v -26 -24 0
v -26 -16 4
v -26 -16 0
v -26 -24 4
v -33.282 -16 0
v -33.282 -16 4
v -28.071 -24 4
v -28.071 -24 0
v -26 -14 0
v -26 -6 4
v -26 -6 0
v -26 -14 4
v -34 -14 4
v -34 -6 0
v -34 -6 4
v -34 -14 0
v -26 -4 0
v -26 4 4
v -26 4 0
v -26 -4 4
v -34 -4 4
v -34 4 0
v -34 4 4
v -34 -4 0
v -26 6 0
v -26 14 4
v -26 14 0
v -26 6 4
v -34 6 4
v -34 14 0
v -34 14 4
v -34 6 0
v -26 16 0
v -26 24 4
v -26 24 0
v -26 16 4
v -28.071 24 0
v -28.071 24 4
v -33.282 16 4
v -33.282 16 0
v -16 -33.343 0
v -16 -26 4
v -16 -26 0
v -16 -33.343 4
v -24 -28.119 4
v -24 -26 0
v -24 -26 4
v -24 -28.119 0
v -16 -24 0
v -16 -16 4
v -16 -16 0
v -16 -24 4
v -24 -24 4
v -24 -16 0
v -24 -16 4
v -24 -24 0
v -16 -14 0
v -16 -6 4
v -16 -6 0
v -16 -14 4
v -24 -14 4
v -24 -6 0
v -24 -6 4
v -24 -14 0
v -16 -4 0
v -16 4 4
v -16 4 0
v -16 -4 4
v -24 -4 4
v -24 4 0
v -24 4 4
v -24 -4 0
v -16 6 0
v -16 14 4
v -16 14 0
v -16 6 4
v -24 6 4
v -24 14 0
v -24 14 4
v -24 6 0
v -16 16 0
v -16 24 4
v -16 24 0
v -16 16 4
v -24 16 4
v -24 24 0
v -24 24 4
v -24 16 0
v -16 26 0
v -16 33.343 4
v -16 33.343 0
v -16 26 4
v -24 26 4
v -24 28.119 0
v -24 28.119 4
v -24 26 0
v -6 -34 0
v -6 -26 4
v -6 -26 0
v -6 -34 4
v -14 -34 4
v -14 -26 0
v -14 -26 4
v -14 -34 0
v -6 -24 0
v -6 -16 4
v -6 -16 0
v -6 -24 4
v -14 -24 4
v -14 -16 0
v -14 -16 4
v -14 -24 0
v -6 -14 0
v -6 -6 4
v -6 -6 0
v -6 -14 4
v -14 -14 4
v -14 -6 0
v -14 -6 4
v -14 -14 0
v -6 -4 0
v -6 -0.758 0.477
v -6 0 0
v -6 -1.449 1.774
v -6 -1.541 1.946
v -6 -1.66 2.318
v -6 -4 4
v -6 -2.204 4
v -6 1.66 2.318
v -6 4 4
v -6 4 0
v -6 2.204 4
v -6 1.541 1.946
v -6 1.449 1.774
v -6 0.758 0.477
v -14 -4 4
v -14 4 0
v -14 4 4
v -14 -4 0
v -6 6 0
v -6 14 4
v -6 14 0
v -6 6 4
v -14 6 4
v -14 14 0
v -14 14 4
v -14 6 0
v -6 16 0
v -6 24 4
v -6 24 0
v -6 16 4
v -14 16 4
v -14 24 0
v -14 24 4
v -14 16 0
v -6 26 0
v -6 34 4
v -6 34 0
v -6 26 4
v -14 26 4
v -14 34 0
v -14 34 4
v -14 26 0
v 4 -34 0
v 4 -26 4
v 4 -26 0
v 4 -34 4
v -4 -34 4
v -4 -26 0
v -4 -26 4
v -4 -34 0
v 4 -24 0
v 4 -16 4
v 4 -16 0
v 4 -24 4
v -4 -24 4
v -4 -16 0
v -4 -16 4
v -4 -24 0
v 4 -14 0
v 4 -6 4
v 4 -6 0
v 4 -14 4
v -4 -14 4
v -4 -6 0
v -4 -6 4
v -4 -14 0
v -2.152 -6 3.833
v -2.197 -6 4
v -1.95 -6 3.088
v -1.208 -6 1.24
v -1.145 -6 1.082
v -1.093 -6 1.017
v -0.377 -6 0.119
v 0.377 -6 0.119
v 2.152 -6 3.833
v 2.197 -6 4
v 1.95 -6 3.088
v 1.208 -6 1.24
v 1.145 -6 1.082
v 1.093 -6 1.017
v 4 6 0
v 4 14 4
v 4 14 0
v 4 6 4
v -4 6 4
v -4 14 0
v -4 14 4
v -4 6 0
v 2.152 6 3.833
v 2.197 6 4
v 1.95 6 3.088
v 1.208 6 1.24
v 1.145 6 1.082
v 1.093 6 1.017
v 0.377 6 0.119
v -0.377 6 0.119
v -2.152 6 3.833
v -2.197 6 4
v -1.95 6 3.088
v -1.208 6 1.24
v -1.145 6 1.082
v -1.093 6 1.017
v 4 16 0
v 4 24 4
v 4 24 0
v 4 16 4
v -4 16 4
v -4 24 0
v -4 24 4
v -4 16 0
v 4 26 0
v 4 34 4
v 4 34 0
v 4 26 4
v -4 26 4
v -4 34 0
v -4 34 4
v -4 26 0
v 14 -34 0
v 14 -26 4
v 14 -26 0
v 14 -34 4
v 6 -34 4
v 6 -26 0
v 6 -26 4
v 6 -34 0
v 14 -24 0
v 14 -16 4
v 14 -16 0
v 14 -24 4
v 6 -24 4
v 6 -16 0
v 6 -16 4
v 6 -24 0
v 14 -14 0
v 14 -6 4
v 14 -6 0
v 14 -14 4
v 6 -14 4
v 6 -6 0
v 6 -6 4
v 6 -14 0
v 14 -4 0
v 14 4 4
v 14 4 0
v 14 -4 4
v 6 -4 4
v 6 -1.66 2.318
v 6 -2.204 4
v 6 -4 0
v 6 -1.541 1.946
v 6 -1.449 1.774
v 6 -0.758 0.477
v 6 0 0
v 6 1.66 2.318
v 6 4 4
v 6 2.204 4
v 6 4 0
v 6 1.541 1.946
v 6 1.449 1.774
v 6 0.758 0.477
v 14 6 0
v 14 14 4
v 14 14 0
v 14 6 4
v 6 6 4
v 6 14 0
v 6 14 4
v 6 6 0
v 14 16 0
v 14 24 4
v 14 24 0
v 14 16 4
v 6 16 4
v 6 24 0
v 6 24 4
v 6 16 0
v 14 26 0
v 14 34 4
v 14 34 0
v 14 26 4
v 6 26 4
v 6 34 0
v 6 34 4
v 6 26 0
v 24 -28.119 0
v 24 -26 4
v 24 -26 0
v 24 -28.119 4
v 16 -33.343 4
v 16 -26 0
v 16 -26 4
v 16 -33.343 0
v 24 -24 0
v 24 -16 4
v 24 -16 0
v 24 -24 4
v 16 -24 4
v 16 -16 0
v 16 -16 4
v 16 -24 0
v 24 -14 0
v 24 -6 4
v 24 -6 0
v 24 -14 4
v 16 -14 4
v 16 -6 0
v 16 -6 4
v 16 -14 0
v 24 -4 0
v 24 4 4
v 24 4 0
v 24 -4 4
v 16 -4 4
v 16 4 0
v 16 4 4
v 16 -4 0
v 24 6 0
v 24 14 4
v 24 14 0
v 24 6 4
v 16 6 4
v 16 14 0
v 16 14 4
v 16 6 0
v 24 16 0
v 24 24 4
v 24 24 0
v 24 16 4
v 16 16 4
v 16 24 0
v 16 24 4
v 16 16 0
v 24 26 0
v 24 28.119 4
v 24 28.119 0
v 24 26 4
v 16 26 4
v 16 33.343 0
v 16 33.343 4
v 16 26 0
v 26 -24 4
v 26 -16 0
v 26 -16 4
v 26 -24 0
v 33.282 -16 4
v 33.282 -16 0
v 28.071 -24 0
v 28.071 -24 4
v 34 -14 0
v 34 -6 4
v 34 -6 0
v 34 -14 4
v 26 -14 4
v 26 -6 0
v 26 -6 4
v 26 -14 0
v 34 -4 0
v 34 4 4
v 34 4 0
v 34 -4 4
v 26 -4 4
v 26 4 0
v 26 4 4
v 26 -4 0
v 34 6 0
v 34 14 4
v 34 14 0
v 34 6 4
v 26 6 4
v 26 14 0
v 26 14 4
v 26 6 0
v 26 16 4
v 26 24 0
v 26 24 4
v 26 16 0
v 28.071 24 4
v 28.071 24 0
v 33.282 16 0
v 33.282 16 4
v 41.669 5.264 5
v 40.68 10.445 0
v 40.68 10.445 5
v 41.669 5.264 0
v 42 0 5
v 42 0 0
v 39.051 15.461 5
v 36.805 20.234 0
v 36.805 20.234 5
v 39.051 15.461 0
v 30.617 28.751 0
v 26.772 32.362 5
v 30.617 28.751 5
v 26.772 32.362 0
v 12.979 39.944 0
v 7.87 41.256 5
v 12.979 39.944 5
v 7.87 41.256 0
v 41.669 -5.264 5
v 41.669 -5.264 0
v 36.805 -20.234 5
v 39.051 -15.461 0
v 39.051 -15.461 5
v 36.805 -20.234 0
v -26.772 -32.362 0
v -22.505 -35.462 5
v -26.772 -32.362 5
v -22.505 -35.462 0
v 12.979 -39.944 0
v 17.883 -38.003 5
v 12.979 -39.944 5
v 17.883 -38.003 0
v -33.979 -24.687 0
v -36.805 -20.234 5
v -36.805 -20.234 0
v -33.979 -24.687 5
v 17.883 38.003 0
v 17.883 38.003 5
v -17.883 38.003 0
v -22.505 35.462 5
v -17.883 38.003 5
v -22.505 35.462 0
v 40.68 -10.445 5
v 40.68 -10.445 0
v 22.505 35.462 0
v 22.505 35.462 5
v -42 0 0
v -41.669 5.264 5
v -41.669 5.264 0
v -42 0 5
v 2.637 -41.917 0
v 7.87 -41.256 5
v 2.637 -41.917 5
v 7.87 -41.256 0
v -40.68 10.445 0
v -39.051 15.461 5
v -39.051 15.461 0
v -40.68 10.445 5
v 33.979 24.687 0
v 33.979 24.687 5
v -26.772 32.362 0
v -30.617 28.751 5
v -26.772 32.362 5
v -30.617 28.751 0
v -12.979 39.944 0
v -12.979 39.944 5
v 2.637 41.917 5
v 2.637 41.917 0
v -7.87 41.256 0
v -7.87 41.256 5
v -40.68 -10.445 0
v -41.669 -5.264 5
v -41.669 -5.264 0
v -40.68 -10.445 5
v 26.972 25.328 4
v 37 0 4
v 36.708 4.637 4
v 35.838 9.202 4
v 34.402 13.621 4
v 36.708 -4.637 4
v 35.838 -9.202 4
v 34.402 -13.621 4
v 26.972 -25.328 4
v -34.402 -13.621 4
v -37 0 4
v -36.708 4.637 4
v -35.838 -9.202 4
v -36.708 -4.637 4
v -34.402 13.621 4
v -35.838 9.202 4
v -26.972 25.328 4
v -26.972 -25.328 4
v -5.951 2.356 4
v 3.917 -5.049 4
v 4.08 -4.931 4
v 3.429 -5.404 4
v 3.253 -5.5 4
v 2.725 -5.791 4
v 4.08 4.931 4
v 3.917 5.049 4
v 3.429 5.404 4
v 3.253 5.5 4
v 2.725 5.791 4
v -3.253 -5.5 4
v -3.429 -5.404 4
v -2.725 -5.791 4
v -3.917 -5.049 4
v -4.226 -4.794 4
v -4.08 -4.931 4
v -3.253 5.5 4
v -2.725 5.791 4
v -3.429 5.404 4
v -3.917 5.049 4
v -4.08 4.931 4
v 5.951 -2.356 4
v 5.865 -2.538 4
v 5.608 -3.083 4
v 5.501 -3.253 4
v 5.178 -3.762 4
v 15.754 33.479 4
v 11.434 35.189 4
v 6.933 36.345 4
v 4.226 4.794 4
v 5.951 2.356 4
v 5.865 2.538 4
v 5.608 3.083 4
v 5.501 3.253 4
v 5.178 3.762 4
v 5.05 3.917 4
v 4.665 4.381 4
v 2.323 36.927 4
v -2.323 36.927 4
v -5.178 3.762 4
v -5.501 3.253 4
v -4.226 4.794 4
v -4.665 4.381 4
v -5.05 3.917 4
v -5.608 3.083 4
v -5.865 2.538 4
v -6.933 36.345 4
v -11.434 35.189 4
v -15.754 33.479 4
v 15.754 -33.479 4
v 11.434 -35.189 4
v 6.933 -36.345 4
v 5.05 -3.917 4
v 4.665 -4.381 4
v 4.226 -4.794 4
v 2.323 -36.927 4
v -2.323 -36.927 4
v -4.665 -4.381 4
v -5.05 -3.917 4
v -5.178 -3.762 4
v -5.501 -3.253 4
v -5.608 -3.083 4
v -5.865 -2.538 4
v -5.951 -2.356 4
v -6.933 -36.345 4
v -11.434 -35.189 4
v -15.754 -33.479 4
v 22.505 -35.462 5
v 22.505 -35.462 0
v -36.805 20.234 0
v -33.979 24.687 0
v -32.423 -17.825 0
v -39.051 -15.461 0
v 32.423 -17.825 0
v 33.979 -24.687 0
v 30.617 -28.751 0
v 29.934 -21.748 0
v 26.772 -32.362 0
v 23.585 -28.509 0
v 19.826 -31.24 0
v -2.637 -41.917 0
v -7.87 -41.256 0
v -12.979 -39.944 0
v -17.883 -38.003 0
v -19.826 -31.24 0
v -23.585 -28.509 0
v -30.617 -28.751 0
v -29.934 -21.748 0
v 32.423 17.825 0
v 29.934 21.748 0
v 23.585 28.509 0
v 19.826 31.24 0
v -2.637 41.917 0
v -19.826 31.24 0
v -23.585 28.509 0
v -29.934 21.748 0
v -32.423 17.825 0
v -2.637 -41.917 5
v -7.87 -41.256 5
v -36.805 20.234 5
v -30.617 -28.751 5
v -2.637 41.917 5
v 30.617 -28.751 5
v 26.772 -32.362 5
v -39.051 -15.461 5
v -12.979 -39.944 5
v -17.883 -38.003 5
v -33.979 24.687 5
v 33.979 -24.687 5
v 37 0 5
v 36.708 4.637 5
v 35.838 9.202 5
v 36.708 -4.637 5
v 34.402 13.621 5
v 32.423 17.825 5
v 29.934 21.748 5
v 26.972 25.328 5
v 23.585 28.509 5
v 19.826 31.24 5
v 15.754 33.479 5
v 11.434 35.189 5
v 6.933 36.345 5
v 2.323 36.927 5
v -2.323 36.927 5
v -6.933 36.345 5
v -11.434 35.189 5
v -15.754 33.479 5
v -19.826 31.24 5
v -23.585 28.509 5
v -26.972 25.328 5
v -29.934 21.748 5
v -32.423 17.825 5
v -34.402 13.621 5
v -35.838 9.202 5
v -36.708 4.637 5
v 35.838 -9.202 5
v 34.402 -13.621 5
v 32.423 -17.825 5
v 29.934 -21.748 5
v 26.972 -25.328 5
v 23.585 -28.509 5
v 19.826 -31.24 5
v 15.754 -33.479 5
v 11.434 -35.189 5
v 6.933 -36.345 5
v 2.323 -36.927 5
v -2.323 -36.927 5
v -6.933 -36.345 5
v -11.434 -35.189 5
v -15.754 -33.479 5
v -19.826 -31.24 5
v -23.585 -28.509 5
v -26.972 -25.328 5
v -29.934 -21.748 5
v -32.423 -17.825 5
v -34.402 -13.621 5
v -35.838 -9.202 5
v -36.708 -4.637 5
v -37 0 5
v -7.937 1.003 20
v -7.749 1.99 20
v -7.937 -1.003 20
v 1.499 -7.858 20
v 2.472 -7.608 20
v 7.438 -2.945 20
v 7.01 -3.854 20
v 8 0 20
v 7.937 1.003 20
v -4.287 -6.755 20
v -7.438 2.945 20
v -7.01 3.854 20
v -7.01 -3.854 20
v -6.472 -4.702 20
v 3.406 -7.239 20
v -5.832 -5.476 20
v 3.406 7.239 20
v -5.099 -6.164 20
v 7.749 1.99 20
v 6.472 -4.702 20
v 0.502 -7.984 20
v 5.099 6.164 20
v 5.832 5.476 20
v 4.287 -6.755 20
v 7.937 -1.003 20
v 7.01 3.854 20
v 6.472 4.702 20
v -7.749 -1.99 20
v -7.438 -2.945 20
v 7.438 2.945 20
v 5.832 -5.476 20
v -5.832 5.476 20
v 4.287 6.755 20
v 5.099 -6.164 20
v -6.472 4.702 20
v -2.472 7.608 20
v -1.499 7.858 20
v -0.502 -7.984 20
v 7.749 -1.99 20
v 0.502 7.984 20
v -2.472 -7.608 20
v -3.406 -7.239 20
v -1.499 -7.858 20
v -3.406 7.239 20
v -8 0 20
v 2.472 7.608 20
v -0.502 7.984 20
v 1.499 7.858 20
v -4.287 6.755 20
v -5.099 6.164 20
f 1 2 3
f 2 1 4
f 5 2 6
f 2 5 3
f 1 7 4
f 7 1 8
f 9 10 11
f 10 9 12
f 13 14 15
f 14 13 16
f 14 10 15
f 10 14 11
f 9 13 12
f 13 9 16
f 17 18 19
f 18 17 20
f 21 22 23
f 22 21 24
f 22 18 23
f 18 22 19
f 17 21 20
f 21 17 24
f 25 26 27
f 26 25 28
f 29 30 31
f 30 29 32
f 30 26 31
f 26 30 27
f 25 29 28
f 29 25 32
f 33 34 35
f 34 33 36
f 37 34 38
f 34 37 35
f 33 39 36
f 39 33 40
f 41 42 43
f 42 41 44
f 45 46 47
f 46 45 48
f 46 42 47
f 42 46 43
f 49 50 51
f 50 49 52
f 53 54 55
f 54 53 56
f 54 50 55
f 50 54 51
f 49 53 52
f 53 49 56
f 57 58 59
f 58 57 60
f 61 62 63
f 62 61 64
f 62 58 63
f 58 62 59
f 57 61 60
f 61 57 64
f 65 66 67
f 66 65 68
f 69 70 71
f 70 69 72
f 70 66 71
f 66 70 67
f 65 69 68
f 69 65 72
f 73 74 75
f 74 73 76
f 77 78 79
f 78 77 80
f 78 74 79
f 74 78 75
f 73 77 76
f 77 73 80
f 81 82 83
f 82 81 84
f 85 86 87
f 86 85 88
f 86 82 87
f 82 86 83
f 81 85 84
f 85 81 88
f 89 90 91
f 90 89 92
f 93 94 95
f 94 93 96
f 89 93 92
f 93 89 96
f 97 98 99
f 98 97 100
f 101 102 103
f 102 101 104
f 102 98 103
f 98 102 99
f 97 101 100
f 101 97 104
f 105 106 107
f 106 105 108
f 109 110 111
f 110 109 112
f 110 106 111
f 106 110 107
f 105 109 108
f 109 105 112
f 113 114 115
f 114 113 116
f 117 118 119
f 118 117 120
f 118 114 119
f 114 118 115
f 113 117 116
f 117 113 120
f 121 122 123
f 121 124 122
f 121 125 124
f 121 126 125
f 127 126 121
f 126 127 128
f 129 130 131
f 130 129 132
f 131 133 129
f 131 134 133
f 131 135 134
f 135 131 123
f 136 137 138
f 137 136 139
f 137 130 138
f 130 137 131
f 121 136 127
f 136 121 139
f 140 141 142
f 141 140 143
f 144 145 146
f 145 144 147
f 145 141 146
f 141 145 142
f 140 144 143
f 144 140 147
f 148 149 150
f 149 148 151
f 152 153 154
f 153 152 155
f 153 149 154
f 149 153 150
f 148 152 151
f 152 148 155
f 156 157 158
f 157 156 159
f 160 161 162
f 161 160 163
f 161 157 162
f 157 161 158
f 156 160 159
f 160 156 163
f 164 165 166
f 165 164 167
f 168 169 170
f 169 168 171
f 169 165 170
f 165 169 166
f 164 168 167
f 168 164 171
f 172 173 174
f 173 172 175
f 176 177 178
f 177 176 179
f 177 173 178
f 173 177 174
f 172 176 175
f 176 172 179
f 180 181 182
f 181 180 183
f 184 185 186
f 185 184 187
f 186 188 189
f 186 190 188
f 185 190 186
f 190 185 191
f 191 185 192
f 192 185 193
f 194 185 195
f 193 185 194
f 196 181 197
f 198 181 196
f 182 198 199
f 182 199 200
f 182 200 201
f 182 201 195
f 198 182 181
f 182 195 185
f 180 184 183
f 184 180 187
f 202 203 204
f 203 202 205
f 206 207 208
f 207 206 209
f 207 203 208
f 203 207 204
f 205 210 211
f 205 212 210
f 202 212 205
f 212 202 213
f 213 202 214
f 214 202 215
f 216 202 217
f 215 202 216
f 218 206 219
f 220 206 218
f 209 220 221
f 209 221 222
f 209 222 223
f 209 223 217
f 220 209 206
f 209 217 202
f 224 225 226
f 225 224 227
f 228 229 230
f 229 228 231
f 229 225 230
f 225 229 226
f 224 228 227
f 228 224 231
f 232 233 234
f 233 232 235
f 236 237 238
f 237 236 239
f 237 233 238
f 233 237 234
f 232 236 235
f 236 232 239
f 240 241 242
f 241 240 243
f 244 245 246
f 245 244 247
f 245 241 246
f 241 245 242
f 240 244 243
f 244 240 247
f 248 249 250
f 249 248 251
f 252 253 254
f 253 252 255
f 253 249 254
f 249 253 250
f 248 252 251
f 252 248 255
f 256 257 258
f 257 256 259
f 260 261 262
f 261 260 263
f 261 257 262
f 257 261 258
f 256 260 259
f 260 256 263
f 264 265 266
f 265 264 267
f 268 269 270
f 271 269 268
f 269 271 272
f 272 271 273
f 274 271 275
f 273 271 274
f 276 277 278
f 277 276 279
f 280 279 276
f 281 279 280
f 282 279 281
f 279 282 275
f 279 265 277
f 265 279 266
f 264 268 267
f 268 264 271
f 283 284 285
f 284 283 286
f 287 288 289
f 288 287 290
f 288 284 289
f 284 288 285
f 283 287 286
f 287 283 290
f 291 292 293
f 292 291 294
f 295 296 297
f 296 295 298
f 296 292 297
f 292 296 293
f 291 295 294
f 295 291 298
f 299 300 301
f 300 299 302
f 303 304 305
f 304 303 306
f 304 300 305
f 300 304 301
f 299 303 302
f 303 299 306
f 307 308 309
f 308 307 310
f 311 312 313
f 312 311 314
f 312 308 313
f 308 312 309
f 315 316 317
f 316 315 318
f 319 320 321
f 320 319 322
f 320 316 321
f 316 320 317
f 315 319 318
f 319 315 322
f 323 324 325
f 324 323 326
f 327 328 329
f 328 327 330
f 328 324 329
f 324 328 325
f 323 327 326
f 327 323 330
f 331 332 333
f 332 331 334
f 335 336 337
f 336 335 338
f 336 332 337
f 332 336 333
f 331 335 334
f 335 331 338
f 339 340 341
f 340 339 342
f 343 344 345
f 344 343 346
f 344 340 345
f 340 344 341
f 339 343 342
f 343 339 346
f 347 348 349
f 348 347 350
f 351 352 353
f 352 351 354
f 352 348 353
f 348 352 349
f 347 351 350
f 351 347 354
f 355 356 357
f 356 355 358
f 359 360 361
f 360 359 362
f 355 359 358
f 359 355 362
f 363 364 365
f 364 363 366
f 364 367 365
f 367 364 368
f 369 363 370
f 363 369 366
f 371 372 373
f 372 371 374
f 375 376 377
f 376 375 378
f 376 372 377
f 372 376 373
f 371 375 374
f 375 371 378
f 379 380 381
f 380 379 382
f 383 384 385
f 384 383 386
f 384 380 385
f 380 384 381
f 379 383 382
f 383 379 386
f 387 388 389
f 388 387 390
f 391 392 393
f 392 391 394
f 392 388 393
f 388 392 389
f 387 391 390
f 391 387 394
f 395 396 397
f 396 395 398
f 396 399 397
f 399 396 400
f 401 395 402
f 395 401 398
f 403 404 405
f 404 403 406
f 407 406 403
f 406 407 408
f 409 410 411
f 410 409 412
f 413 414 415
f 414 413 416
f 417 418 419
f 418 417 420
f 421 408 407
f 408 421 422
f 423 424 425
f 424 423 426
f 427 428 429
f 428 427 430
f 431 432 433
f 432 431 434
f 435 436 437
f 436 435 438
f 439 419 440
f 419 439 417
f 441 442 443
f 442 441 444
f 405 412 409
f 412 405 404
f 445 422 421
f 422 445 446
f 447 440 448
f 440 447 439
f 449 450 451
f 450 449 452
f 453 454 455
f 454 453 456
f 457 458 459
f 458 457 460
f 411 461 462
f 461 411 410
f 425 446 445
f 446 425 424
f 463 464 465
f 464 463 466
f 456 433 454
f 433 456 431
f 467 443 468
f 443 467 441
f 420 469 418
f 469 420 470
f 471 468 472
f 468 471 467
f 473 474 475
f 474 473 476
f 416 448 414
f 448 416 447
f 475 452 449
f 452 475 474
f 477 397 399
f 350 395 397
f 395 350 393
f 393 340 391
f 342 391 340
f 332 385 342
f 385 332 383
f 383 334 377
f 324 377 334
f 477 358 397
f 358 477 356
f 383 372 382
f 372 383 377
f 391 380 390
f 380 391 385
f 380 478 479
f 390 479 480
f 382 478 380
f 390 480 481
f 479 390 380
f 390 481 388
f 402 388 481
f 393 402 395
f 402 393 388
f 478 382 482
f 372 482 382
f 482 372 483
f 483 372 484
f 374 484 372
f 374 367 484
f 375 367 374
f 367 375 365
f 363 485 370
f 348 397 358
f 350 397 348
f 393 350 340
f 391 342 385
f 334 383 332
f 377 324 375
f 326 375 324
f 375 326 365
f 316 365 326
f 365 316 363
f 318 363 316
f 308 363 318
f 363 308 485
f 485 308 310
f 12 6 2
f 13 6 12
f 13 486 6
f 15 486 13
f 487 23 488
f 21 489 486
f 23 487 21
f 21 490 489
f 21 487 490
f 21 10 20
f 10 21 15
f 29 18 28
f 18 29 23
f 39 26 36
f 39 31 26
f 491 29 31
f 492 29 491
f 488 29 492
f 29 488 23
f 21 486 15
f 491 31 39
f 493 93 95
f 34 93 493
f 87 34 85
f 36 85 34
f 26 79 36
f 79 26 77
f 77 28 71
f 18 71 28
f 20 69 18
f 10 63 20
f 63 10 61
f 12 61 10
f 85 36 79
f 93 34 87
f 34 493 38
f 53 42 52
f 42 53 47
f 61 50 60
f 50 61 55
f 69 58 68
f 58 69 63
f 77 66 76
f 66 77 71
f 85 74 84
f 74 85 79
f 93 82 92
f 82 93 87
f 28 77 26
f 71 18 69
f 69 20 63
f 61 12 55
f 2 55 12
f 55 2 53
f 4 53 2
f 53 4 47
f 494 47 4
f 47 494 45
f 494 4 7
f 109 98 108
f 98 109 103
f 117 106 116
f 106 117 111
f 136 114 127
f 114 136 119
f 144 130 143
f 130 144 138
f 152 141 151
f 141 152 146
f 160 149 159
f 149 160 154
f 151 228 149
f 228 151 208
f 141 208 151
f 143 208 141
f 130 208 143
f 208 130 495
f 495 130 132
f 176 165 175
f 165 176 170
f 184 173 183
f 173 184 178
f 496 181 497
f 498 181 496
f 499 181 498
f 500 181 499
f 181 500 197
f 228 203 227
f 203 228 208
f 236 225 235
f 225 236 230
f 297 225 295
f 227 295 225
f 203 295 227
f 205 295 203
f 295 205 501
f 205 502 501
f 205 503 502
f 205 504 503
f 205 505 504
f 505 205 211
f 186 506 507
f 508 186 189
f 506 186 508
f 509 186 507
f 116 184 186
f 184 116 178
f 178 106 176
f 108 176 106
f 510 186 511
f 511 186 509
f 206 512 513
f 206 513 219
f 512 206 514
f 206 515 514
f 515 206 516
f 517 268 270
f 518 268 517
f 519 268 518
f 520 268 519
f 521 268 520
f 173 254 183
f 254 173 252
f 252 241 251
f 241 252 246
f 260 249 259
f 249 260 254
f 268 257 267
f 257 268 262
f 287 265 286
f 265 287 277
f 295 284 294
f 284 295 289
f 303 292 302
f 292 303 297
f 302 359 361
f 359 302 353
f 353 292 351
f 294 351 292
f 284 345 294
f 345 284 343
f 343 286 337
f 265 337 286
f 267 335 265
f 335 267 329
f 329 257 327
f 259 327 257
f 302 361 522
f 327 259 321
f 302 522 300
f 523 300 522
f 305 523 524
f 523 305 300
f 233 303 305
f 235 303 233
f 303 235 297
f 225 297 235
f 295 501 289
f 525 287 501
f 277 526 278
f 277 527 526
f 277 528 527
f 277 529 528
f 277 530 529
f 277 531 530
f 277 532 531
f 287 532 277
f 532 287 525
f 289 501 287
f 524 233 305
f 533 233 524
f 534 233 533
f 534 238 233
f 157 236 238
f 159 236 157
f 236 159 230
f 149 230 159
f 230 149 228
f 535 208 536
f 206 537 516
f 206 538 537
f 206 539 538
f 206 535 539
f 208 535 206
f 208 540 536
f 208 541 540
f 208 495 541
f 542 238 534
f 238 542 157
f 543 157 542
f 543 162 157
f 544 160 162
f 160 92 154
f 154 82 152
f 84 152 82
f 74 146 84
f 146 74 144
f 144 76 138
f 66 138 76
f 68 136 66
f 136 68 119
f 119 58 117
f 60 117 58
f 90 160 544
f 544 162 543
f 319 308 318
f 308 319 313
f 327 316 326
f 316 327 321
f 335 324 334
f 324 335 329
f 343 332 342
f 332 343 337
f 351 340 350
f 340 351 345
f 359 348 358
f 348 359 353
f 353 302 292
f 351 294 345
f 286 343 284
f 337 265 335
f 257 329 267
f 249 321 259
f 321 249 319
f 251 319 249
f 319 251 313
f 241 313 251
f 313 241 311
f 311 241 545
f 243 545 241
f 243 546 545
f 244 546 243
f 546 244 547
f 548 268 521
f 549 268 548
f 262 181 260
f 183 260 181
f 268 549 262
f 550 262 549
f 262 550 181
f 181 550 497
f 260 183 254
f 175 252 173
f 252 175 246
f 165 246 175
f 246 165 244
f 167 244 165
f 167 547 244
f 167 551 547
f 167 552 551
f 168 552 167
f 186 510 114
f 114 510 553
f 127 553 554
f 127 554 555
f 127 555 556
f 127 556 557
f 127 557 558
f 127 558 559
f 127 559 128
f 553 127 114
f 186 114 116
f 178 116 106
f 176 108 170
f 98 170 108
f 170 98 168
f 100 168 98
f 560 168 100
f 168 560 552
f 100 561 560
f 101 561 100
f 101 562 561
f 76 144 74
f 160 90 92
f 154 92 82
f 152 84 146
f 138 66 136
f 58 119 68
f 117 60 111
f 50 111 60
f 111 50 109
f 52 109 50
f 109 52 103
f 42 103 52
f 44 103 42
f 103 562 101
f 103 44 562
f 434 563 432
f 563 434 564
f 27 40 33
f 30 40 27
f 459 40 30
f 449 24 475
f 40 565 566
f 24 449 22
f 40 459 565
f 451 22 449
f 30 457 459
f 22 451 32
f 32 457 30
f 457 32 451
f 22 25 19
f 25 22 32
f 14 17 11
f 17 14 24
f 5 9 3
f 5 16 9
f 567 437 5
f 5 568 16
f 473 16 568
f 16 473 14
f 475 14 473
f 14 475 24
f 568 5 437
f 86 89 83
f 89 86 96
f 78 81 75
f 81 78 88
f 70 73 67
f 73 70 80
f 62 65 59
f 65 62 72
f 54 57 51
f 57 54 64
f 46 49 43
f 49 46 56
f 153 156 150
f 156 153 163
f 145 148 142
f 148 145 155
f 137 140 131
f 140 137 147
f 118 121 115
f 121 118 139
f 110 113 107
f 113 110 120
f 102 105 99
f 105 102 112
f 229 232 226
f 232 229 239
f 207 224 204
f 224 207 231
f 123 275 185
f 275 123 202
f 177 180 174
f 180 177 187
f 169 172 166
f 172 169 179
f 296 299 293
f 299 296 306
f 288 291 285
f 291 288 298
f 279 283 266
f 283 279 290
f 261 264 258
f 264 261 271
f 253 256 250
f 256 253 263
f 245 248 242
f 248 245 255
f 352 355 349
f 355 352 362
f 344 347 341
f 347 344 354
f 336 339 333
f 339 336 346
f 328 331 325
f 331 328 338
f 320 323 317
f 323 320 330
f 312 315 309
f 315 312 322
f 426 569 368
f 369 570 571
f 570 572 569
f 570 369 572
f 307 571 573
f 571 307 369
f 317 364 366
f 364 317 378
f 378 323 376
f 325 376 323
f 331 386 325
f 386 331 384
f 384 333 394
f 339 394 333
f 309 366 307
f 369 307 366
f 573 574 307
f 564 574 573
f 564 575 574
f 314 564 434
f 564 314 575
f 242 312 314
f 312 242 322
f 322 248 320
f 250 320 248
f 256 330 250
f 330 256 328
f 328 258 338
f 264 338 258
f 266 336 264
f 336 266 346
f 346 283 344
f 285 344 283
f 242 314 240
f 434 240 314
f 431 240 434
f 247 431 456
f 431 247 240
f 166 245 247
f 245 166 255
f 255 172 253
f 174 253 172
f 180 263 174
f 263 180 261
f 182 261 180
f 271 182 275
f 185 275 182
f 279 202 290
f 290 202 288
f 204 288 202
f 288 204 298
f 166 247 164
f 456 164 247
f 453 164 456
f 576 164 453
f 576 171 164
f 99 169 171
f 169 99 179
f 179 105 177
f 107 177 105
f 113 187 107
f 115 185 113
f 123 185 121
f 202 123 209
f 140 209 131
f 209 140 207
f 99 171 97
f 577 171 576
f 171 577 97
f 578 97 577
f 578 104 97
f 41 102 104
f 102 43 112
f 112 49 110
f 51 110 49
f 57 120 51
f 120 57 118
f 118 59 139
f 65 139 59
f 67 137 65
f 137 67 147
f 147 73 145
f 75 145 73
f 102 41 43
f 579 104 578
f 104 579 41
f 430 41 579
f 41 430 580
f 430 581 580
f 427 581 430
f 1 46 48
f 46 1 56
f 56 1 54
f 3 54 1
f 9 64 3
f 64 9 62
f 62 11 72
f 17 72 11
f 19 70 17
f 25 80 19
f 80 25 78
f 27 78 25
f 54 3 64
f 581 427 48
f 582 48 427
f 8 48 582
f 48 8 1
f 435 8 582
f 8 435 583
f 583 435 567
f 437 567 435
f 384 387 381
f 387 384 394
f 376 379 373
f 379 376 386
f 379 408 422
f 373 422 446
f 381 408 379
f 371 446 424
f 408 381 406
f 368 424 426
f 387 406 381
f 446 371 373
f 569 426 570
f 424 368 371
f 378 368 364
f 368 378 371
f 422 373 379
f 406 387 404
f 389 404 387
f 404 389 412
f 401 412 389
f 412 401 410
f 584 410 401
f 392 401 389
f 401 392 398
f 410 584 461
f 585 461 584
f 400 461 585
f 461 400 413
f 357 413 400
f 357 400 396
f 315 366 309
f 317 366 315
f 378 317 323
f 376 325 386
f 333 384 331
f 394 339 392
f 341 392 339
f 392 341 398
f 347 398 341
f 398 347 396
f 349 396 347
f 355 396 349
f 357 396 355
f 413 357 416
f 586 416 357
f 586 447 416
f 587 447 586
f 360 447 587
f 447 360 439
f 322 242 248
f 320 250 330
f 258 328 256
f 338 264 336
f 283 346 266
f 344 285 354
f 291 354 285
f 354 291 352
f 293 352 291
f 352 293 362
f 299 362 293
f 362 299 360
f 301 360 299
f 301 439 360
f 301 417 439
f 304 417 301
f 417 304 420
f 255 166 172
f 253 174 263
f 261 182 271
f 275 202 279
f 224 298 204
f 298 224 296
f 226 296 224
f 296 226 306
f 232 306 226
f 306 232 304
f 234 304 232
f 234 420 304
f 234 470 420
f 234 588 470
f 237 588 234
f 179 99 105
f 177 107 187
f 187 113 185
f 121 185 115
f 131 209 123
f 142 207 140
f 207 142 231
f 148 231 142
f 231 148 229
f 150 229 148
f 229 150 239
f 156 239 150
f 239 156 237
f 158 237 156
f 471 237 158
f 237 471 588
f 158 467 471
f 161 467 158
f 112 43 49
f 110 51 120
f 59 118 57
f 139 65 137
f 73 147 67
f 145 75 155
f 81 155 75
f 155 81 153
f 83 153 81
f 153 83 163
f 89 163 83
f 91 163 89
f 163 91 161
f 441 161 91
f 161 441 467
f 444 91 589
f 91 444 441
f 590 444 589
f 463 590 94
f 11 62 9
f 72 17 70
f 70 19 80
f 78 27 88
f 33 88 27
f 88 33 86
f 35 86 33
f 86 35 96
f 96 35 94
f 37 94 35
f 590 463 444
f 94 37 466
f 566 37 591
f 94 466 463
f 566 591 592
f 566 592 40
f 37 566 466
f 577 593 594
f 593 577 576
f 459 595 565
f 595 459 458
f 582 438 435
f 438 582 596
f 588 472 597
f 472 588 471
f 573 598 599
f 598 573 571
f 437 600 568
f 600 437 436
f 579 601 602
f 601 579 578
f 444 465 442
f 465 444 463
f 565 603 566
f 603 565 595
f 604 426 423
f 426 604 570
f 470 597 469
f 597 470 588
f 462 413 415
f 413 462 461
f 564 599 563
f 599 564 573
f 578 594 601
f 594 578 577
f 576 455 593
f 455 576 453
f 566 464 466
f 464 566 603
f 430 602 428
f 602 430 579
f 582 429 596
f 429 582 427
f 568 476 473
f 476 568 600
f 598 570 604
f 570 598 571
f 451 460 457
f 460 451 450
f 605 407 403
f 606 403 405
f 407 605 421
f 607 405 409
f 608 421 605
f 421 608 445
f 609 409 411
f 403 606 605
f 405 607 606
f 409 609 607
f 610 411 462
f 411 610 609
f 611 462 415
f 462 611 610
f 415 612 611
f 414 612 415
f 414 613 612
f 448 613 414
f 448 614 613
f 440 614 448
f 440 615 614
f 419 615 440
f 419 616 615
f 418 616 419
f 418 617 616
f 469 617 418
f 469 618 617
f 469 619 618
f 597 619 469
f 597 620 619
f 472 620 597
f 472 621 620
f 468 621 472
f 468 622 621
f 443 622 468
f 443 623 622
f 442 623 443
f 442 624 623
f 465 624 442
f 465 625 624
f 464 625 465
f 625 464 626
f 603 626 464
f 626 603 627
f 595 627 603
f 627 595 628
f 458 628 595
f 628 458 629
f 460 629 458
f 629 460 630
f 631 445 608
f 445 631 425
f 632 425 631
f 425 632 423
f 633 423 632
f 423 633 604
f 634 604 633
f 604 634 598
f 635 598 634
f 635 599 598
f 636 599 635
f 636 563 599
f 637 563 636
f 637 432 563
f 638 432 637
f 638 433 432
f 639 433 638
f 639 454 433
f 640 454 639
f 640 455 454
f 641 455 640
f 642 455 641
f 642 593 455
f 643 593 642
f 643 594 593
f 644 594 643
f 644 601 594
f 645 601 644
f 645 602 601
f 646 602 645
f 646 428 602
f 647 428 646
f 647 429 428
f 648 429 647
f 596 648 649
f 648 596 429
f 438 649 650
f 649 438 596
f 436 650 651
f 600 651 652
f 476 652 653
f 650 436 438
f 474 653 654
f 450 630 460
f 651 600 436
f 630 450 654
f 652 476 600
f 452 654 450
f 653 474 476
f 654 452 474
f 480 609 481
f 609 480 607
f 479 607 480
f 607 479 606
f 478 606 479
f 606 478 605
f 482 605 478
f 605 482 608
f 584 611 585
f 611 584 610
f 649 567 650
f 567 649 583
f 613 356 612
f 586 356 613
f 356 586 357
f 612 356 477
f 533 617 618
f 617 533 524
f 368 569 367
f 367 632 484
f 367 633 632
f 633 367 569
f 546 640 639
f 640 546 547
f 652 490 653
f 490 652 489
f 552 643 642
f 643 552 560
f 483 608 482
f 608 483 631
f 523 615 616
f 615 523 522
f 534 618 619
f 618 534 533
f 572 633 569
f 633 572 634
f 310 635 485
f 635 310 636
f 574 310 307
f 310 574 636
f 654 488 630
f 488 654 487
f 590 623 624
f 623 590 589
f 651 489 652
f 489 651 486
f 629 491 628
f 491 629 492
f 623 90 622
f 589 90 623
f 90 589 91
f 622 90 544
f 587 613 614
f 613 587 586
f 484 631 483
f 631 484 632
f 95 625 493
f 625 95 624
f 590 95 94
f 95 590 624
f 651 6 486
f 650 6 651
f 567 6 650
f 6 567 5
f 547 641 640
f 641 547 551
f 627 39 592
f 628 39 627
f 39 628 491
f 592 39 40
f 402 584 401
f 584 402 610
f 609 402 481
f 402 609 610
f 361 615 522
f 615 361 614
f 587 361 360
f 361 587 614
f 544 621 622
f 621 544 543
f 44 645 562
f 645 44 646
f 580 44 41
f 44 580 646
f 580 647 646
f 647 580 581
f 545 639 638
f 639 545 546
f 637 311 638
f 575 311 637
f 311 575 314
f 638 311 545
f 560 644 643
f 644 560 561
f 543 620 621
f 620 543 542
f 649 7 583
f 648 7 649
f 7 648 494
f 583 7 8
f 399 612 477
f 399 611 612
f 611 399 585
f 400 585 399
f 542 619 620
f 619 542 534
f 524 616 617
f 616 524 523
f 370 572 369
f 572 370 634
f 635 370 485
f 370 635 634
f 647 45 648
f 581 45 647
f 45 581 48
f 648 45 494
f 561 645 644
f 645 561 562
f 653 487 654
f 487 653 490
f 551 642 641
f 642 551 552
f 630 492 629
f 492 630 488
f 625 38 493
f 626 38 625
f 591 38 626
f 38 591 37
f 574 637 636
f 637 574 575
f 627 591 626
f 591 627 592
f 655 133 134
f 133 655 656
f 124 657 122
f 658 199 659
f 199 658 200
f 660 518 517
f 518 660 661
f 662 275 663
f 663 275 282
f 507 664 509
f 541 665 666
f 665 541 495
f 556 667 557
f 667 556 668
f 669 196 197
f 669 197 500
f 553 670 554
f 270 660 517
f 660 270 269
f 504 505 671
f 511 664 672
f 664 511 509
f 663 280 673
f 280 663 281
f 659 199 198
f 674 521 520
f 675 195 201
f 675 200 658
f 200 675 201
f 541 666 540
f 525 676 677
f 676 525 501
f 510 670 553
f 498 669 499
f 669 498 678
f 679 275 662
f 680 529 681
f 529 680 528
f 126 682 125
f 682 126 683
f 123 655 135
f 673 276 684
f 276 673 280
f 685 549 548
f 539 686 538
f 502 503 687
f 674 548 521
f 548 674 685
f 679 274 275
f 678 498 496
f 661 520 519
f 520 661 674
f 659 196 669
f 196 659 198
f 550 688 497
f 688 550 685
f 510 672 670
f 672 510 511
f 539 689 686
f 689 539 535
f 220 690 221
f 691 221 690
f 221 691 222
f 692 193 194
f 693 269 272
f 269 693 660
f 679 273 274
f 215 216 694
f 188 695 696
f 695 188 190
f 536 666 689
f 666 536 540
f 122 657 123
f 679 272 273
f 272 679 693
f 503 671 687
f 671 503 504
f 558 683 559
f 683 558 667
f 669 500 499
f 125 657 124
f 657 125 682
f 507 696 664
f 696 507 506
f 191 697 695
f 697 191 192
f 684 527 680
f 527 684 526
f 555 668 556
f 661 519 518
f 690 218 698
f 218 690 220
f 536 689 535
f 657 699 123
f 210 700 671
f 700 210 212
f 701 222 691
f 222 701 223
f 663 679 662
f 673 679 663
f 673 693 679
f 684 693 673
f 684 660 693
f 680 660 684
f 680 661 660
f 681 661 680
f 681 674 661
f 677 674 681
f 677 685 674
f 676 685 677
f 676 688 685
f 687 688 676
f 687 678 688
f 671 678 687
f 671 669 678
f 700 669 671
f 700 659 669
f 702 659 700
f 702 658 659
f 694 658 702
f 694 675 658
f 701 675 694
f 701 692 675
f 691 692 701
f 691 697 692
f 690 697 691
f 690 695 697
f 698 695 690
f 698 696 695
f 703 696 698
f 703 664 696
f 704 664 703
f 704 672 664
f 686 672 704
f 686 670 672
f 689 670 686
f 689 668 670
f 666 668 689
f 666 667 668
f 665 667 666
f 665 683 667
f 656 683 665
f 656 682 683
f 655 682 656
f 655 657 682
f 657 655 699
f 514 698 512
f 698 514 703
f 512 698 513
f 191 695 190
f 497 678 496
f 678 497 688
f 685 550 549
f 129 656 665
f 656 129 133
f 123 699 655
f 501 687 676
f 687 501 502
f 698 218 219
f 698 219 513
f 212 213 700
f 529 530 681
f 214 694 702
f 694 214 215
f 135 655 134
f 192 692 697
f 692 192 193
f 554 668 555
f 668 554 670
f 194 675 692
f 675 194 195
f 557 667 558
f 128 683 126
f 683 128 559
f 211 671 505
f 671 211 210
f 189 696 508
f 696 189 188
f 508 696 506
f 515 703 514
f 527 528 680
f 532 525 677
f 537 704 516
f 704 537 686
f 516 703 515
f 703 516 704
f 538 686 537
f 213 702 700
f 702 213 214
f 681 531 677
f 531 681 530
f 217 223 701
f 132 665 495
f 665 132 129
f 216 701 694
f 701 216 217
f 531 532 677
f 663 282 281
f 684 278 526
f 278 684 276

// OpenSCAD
// sink drain diameter
1_drain_diameter = 84; // [50:100]

// outer ring height
2_rim_height = 5; // [4:6]
// outer ring width
3_rim_width = 5; // [4:8]

// trap grid height
4_mesh_height = 4; // [2:4]
// grid line thickness
5_mesh_thickness = 2; // [1:4]
// grid hole width
6_mesh_hole_width = 8; // [6:10]

// handle height
7_handle_height = 20; // [10:30]
// handle top diameter
8_handle_diameter = 16; // [14:20]

function polar_dist(x, y) = sqrt(pow(x, 2) + pow(y, 2));

mesh_spacing = 6_mesh_hole_width + 5_mesh_thickness;
num_holes = floor((1_drain_diameter/2)/mesh_spacing);

$fn=50;

union()
{
    // Mesh
    difference()
    {
        cylinder(r=1_drain_diameter/2, h=4_mesh_height);

        for (x = [-num_holes:num_holes])
        {
            for (y = [-num_holes:num_holes])
            {
                if (polar_dist(x * mesh_spacing, y * mesh_spacing) < (1_drain_diameter / 2) - 3_rim_width)
                {
                    translate([
                        x * mesh_spacing,
                        y * mesh_spacing,
                        4_mesh_height/2])
                    cube([6_mesh_hole_width, 6_mesh_hole_width, 4_mesh_height+0.1], center=true);
                }
            }
        }
    }

    // Rim
    difference()
    {
        cylinder(r=1_drain_diameter/2, h=2_rim_height);

        translate([0, 0, -0.05])
        cylinder(r=1_drain_diameter/2-3_rim_width, h=2_rim_height+0.1);
    }

    // Handle
    cylinder(r1=6_mesh_hole_width/2+5_mesh_thickness, r2=8_handle_diameter/2, h=7_handle_height);
}
